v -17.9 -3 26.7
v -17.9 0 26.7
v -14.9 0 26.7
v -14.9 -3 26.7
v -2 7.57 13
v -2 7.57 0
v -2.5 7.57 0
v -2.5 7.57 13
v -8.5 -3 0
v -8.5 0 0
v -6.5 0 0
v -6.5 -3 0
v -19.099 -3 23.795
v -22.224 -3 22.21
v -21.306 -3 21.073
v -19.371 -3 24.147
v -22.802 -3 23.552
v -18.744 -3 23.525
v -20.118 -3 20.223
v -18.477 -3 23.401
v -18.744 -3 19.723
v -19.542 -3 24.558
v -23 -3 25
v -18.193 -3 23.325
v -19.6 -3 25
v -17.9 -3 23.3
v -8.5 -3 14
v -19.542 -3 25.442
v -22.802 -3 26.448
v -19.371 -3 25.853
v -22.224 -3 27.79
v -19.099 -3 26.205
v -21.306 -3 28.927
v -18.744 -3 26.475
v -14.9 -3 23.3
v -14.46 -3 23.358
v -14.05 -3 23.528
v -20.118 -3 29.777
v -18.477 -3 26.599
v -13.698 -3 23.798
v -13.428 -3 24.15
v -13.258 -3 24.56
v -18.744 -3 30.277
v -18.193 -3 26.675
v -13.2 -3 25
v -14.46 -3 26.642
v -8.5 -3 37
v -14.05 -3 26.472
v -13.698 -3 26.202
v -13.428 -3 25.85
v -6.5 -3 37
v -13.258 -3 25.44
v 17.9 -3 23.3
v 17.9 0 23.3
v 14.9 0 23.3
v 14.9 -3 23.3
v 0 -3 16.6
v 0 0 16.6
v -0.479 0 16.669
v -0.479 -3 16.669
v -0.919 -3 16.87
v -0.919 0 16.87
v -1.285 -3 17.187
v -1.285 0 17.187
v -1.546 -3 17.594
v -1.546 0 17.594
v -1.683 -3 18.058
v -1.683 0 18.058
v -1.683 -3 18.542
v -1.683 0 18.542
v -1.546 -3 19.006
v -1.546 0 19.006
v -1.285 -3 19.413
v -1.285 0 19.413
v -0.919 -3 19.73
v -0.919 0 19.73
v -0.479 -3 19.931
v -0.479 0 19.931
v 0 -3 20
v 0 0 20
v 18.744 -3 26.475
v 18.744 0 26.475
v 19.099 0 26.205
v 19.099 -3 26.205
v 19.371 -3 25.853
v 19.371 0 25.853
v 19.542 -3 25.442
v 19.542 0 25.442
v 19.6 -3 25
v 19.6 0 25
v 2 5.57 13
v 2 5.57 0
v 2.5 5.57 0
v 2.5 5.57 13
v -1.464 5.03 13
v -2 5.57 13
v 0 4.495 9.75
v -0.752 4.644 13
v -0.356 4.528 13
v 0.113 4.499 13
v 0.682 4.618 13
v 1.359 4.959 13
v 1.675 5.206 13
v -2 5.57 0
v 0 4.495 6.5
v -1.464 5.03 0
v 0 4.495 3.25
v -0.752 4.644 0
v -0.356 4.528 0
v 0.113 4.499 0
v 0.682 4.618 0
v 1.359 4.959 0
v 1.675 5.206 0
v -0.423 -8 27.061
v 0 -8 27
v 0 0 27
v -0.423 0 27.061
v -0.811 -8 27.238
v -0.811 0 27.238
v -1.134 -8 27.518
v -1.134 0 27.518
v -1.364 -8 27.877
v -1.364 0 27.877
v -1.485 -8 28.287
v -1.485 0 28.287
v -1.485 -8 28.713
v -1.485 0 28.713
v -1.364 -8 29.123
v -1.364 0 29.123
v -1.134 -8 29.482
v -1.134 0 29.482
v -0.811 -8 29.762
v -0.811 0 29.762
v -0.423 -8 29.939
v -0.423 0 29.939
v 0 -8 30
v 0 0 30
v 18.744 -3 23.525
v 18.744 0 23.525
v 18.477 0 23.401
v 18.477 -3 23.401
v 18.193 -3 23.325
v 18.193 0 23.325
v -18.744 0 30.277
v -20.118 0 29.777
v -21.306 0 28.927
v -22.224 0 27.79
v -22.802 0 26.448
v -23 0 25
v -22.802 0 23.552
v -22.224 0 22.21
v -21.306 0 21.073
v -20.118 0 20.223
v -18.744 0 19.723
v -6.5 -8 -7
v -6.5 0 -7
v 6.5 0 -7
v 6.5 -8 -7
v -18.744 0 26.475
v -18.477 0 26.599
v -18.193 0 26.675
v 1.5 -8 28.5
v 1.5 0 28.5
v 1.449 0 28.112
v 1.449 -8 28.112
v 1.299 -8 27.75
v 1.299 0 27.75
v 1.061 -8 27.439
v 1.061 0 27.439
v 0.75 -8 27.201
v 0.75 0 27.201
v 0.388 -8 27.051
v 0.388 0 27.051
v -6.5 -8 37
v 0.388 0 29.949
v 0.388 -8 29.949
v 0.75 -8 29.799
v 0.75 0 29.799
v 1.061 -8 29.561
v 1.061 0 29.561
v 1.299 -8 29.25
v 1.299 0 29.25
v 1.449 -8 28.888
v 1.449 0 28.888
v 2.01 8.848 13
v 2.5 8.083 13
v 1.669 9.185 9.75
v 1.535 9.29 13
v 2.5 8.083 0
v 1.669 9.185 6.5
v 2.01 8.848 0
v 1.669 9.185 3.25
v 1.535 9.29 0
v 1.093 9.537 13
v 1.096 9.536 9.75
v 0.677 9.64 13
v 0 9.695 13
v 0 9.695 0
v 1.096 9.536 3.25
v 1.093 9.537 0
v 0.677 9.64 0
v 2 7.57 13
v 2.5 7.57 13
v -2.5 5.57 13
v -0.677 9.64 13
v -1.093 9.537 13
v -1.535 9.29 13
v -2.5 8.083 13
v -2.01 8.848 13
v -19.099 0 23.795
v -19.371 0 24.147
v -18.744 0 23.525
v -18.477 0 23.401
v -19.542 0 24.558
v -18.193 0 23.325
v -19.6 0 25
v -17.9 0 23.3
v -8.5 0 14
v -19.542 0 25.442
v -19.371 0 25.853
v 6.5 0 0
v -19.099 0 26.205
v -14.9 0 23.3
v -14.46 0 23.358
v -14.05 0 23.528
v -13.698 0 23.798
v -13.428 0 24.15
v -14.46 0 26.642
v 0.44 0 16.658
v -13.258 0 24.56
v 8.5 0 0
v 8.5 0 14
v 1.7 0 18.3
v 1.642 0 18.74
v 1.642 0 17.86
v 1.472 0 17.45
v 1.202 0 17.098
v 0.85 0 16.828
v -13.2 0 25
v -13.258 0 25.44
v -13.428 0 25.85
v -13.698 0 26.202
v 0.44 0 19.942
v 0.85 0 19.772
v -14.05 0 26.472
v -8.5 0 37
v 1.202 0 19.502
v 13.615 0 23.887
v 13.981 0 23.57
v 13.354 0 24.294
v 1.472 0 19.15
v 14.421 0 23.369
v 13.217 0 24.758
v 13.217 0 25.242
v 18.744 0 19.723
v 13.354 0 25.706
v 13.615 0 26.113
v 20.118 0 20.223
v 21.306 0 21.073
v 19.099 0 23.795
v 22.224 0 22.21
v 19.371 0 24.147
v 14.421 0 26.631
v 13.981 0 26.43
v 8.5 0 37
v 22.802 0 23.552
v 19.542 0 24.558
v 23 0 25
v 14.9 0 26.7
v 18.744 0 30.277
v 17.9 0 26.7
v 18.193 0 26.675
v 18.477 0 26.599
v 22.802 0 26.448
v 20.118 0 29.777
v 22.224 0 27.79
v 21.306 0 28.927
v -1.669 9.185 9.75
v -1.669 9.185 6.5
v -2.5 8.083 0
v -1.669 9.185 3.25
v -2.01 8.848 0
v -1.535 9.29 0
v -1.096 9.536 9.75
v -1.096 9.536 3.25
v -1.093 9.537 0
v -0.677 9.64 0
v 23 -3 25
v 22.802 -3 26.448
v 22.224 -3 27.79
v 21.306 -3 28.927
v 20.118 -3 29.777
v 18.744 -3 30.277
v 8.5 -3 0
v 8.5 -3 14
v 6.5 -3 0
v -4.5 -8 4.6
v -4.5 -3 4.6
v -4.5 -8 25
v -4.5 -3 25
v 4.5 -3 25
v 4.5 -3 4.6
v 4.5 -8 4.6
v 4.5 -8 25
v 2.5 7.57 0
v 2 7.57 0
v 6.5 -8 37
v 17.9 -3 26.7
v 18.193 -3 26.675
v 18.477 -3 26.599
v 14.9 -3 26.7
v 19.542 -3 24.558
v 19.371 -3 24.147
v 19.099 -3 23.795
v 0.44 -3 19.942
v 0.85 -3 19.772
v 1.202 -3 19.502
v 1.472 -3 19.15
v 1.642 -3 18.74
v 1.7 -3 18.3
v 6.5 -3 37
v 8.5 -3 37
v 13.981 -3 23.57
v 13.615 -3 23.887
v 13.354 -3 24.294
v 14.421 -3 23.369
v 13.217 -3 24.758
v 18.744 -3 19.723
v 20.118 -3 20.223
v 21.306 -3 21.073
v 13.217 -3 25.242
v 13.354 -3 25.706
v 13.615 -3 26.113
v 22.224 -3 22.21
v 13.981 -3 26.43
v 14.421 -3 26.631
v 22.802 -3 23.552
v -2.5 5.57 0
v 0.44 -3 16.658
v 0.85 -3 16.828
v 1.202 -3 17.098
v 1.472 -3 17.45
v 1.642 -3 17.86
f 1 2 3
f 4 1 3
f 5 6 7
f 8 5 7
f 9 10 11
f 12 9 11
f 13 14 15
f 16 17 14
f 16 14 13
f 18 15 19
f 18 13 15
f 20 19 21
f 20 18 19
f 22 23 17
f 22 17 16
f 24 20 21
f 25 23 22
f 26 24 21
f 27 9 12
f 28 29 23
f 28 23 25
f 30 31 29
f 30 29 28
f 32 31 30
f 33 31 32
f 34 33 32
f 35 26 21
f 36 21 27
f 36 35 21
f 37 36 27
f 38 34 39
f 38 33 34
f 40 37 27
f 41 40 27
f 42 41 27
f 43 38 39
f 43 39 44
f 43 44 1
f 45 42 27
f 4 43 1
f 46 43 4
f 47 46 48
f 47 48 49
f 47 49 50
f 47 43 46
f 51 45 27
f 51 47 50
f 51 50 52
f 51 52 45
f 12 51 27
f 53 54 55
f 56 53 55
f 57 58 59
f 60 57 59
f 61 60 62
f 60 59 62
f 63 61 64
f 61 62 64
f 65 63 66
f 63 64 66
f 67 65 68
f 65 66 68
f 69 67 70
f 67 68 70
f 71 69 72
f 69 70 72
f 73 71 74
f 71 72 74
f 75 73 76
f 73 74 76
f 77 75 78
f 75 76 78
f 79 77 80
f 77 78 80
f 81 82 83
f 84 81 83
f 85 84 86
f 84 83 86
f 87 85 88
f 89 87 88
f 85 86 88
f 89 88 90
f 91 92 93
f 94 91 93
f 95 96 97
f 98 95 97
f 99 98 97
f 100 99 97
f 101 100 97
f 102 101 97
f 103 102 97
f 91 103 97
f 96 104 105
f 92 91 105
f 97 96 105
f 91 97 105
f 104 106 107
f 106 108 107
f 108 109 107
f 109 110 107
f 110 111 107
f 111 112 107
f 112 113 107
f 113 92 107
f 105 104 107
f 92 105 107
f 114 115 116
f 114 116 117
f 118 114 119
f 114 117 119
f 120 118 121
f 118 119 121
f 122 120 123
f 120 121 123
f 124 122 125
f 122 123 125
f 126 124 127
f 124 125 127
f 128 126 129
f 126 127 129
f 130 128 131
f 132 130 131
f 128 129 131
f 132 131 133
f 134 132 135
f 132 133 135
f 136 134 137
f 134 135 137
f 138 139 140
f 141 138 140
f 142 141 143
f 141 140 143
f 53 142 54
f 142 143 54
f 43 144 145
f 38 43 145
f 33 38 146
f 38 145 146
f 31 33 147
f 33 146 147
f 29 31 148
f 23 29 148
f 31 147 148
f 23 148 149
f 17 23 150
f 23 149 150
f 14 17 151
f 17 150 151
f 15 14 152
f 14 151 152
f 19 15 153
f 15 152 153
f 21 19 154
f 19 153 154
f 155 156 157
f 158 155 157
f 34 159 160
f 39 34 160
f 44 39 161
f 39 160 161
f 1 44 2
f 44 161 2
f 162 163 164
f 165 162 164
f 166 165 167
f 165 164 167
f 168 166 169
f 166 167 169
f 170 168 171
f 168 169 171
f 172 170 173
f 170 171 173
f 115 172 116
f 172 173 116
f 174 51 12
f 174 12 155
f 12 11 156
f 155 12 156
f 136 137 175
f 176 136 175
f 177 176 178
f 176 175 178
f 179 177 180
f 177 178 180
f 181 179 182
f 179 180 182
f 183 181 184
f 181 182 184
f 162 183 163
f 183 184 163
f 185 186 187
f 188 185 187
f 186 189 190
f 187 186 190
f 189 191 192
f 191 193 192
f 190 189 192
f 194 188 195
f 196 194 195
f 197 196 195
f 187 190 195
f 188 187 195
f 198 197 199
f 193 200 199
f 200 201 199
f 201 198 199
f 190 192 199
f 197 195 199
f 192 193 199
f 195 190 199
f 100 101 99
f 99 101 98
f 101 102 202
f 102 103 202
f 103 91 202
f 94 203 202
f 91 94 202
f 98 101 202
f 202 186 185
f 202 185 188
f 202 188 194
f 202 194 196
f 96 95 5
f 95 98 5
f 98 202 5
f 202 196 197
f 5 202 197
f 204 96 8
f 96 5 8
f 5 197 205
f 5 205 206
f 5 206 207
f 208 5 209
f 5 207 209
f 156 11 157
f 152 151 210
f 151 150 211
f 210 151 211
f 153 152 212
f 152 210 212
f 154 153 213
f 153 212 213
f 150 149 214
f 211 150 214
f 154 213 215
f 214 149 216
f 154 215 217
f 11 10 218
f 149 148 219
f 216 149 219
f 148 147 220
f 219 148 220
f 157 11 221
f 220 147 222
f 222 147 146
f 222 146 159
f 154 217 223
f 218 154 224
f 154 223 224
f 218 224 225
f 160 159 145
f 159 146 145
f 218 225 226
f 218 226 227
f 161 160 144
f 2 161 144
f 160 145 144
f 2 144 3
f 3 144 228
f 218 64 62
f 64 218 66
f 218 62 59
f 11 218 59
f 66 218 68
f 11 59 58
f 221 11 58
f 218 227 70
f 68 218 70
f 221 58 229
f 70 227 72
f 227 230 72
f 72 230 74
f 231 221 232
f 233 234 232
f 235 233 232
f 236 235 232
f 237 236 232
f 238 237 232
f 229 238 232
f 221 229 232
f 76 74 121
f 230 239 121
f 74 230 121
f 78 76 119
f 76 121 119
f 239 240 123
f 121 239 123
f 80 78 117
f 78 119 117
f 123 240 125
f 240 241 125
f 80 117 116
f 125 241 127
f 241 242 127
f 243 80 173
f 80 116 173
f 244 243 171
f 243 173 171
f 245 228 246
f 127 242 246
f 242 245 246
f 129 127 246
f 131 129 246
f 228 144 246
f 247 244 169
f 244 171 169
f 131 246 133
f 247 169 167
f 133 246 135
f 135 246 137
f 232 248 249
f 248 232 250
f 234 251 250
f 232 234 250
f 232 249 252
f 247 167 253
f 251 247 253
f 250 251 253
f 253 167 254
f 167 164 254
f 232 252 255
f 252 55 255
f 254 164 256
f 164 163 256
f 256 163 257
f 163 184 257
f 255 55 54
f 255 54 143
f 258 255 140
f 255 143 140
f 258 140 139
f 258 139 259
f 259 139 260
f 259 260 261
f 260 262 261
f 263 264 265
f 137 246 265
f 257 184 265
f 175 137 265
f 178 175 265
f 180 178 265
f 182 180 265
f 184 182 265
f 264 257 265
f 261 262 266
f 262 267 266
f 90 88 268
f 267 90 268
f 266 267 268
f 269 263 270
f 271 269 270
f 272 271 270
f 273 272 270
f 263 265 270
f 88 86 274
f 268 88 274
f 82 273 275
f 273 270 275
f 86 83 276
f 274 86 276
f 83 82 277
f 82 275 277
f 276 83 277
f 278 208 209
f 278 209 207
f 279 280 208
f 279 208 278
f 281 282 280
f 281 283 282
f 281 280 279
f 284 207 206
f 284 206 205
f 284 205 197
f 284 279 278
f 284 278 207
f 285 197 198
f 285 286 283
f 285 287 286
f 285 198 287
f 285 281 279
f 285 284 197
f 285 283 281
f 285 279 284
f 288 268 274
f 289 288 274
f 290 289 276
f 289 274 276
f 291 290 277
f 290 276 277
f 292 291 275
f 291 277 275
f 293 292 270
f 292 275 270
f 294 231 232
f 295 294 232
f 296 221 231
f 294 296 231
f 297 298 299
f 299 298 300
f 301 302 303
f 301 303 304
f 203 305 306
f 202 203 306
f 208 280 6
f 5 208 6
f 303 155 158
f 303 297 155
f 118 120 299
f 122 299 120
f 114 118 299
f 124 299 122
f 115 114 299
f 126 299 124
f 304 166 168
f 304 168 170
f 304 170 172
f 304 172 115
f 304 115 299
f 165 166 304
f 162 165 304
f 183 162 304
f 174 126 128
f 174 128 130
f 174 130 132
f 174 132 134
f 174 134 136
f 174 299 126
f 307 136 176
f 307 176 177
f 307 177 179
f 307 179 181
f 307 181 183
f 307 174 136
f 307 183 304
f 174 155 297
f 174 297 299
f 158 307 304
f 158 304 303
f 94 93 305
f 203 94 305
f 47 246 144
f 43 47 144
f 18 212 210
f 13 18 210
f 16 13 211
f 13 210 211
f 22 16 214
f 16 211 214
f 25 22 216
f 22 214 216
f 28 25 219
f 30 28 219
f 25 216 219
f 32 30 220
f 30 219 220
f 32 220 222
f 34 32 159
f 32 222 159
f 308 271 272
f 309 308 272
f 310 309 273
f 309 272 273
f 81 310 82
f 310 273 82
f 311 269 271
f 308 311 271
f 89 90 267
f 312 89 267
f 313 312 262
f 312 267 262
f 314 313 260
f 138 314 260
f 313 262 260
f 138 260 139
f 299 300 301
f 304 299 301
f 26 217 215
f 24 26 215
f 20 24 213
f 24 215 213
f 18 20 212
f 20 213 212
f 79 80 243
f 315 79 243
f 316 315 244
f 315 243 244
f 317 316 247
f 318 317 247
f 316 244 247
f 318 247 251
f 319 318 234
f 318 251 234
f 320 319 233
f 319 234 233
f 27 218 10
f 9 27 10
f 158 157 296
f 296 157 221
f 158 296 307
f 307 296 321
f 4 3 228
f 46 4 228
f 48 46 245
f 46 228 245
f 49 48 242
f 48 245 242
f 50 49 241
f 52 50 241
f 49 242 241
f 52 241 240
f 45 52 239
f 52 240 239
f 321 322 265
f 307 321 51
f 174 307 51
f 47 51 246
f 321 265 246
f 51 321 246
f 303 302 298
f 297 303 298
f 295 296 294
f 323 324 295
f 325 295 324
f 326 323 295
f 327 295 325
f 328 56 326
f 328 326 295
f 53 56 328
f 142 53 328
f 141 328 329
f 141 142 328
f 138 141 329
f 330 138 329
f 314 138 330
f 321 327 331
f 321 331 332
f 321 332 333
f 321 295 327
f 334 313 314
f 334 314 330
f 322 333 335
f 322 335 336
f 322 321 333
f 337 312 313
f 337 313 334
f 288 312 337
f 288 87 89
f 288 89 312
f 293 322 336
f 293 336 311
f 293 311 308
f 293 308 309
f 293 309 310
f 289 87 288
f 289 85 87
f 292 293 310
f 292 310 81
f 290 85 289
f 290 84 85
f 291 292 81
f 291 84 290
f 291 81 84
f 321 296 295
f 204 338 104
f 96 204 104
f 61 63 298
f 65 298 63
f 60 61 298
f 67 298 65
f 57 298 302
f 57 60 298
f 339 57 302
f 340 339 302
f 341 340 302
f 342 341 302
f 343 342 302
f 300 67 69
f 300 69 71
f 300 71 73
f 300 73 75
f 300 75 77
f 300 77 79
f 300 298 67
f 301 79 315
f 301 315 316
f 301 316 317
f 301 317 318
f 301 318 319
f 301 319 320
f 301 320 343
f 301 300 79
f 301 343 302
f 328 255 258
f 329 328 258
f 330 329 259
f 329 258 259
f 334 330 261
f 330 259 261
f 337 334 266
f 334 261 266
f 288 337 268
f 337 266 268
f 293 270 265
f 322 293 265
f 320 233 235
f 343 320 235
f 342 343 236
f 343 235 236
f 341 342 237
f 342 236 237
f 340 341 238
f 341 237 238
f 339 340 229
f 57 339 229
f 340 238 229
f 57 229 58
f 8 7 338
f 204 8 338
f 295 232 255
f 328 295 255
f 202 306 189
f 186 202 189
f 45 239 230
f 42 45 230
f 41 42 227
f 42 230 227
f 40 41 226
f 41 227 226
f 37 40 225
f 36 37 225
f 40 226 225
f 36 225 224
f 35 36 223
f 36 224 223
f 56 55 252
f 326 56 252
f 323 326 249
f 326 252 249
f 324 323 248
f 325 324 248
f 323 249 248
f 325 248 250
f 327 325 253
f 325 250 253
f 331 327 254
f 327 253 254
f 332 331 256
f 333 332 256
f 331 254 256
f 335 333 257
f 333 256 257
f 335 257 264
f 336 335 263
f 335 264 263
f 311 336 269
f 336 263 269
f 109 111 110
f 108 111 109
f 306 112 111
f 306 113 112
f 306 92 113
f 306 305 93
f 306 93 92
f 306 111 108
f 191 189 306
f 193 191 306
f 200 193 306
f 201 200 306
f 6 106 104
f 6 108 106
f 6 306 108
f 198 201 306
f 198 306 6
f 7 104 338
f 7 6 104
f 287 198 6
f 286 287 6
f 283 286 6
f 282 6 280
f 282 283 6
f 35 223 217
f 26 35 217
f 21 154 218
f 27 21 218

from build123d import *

# Parameters (mm, degrees)
F0_W     = 2
F0_H     = 20.4
F0_W_2   = 6.5
F0_H_2   = 7
F1_DEPTH = 8
F2_DEPTH = 3
F4_DEPTH = 13


with BuildPart() as f1:
    # F0 (on Front) → F1 (new body)
    with BuildSketch(Plane.XZ):
        with BuildLine():
            Line((-6.5, 37), (-6.5, 25))
            Line((-6.5, 25), (-4.5, 25))
            Line((-4.5, 25), (0, 25))
            Line((0, 25), (0, 27))
            ThreePointArc((0, 27), (-1.5, 28.5), (0, 30))
            Line((0, 30), (0, 37))
            Line((0, 37), (-6.5, 37))
        make_face()
        with BuildLine():
            Line((0, 25), (4.5, 25))
            Line((4.5, 25), (6.5, 25))
            Line((6.5, 25), (6.5, 37))
            Line((6.5, 37), (0, 37))
            Line((0, 37), (0, 30))
            ThreePointArc((0, 30), (1.0606601718, 29.5606601718), (1.5, 28.5))
            ThreePointArc((1.5, 28.5), (1.0606601718, 27.4393398282), (0, 27))
            Line((0, 27), (0, 25))
        make_face()
        with Locations((5.5, 14.8)):
            Rectangle(F0_W, F0_H)
        Polygon((0, 4.6), (0, 0), (6.5, 0), (6.5, 4.6), (4.5, 4.6), align=None)
        Polygon((-6.5, 0), (0, 0), (0, 4.6), (-4.5, 4.6), (-6.5, 4.6), align=None)
        with Locations((-3.25, -3.5)):
            Rectangle(F0_W_2, F0_H_2)
        with Locations((3.25, -3.5)):
            Rectangle(F0_W_2, F0_H_2)
        with Locations((-5.5, 14.8)):
            Rectangle(F0_W, F0_H)
    extrude(amount=F1_DEPTH)

    # F0 (on Front) → F2 (join)
    with BuildSketch(Plane.XZ):
        Polygon((-8.5, 0), (-6.5, 0), (-6.5, 4.6), (-6.5, 25), (-6.5, 37), (-8.5, 37), (-8.5, 14), align=None)
        with BuildLine():
            Line((-18.7444198489, 19.7226613516), (-8.5, 14))
            Line((-8.5, 14), (-8.5, 37))
            Line((-8.5, 37), (-18.7444198489, 30.2773386484))
            ThreePointArc((-18.7444198489, 30.2773386484), (-14.2102999531, 29.2035620124), (-12.2, 25))
            ThreePointArc((-12.2, 25), (-14.2102999531, 20.7964379876), (-18.7444198489, 19.7226613516))
        make_face()
        with BuildLine():
            Line((-4.5, 4.6), (0, 4.6))
            Line((0, 4.6), (0, 15.1))
            ThreePointArc((0, 15.1), (-3.2, 18.3), (0, 21.5))
            Line((0, 21.5), (0, 25))
            Line((0, 25), (-4.5, 25))
            Line((-4.5, 25), (-4.5, 4.6))
        make_face()
        with BuildLine():
            Line((0, 15.1), (0, 4.6))
            Line((0, 4.6), (4.5, 4.6))
            Line((4.5, 4.6), (4.5, 25))
            Line((4.5, 25), (0, 25))
            Line((0, 25), (0, 21.5))
            ThreePointArc((0, 21.5), (2.2627416998, 20.5627416998), (3.2, 18.3))
            ThreePointArc((3.2, 18.3), (2.2627416998, 16.0372583002), (0, 15.1))
        make_face()
        with BuildLine():
            Line((8.5, 37), (8.5, 14))
            Line((8.5, 14), (18.7444198489, 19.7226613516))
            ThreePointArc((18.7444198489, 19.7226613516), (12.2, 25), (18.7444198489, 30.2773386484))
            Line((18.7444198489, 30.2773386484), (8.5, 37))
        make_face()
        Polygon((6.5, 4.6), (6.5, 0), (8.5, 0), (8.5, 14), (8.5, 37), (6.5, 37), (6.5, 25), align=None)
        with BuildLine():
            Line((-18.7444198489, 23.5245491812), (-18.7444198489, 19.7226613516))
            ThreePointArc((-18.7444198489, 19.7226613516), (-14.2102999531, 20.7964379876), (-12.2, 25))
            ThreePointArc((-12.2, 25), (-14.2102999531, 29.2035620124), (-18.7444198489, 30.2773386484))
            Line((-18.7444198489, 30.2773386484), (-18.7444198489, 26.4754508188))
            ThreePointArc((-18.7444198489, 26.4754508188), (-18.3368830553, 26.6429038913), (-17.9, 26.7))
            Line((-17.9, 26.7), (-14.8999996376, 26.7))
            ThreePointArc((-14.8999996376, 26.7), (-13.6979183439, 26.2020813999), (-13.2, 25))
            ThreePointArc((-13.2, 25), (-13.6979183439, 23.7979186001), (-14.8999996376, 23.3))
            Line((-14.8999996376, 23.3), (-17.9, 23.3))
            ThreePointArc((-17.9, 23.3), (-18.3368830553, 23.3570961087), (-18.7444198489, 23.5245491812))
        make_face()
        with BuildLine():
            ThreePointArc((-18.7444198489, 30.2773386484), (-23, 25), (-18.7444198489, 19.7226613516))
            Line((-18.7444198489, 19.7226613516), (-18.7444198489, 23.5245491812))
            ThreePointArc((-18.7444198489, 23.5245491812), (-19.6, 25), (-18.7444198489, 26.4754508188))
            Line((-18.7444198489, 26.4754508188), (-18.7444198489, 30.2773386484))
        make_face()
        with BuildLine():
            Line((18.7444198489, 23.5245491812), (18.7444198489, 19.7226613516))
            ThreePointArc((18.7444198489, 19.7226613516), (21.8035620124, 21.6102999531), (23, 25))
            ThreePointArc((23, 25), (21.8035620124, 28.3897000469), (18.7444198489, 30.2773386484))
            Line((18.7444198489, 30.2773386484), (18.7444198489, 26.4754508188))
            ThreePointArc((18.7444198489, 26.4754508188), (19.3706314534, 25.8527855114), (19.6, 25))
            ThreePointArc((19.6, 25), (19.3706314534, 24.1472144886), (18.7444198489, 23.5245491812))
        make_face()
        with BuildLine():
            ThreePointArc((18.7444198489, 30.2773386484), (12.2, 25), (18.7444198489, 19.7226613516))
            Line((18.7444198489, 19.7226613516), (18.7444198489, 23.5245491812))
            ThreePointArc((18.7444198489, 23.5245491812), (18.3368830553, 23.3570961087), (17.9, 23.3))
            Line((17.9, 23.3), (14.8999996376, 23.3))
            ThreePointArc((14.8999996376, 23.3), (13.2, 25), (14.8999996376, 26.7))
            Line((14.8999996376, 26.7), (17.9, 26.7))
            ThreePointArc((17.9, 26.7), (18.3368830553, 26.6429038913), (18.7444198489, 26.4754508188))
            Line((18.7444198489, 26.4754508188), (18.7444198489, 30.2773386484))
        make_face()
        with BuildLine():
            ThreePointArc((0, 21.5), (-3.2, 18.3), (0, 15.1))
            Line((0, 15.1), (0, 16.6))
            ThreePointArc((0, 16.6), (-1.7, 18.3), (0, 20))
            Line((0, 20), (0, 21.5))
        make_face()
        with BuildLine():
            Line((0, 16.6), (0, 15.1))
            ThreePointArc((0, 15.1), (2.2627416998, 16.0372583002), (3.2, 18.3))
            ThreePointArc((3.2, 18.3), (2.2627416998, 20.5627416998), (0, 21.5))
            Line((0, 21.5), (0, 20))
            ThreePointArc((0, 20), (1.202081528, 19.502081528), (1.7, 18.3))
            ThreePointArc((1.7, 18.3), (1.202081528, 17.097918472), (0, 16.6))
        make_face()
    extrude(amount=F2_DEPTH)


with BuildPart() as f4:
    # F3 (on Top) → F4 (new body)
    with BuildSketch(Plane.XY):
        with BuildLine():
            add(Edge.make_bspline(
                [(0, 4.4954122202), (-0.4962129107, 4.4954122202), (-1.2134270742, 4.8567158568), (-1.6510507558, 5.1269470714), (-2, 5.5703356247)],
                knots=[0, 0, 0, 0, 0.5093904984, 1, 1, 1, 1], degree=3))
            add(Edge.make_bspline(
                [(0, 4.4954122202), (0.4962129107, 4.4954122202), (1.2134270742, 4.8567158568), (1.6510507558, 5.1269470714), (2, 5.5703356247)],
                knots=[0, 0, 0, 0, 0.5093904984, 1, 1, 1, 1], degree=3))
            Line((2, 5.5703356247), (2.5, 5.5703356247))
            Line((2.5, 5.5703356247), (2.5, 7.5703356247))
            Line((2.5, 7.5703356247), (2, 7.5703356247))
            Line((2, 7.5703356247), (2.5, 8.0828322098))
            add(Edge.make_bspline(
                [(2.5, 8.0828322098), (2.2650851883, 8.5345596151), (2.0555071016, 8.8149741689), (1.6760997611, 9.1983581073), (1.169062252, 9.5528497336), (0.6997972854, 9.6686221595), (0, 9.6954122202)],
                knots=[0, 0, 0, 0, 0.2752762405, 0.4712298953, 0.6789504876, 1, 1, 1, 1], degree=3))
            add(Edge.make_bspline(
                [(-2.5, 8.0828322098), (-2.2650851883, 8.5345596151), (-2.0555071016, 8.8149741689), (-1.6760997611, 9.1983581073), (-1.169062252, 9.5528497336), (-0.6997972854, 9.6686221595), (0, 9.6954122202)],
                knots=[0, 0, 0, 0, 0.2752762405, 0.4712298953, 0.6789504876, 1, 1, 1, 1], degree=3))
            Line((-2.5, 8.0828322098), (-2, 7.5703356247))
            Line((-2, 7.5703356247), (-2.5, 7.5703356247))
            Line((-2.5, 7.5703356247), (-2.5, 5.5703356247))
            Line((-2.5, 5.5703356247), (-2, 5.5703356247))
        make_face()
    extrude(amount=F4_DEPTH)


solid = Compound([f1.part, f4.part])
